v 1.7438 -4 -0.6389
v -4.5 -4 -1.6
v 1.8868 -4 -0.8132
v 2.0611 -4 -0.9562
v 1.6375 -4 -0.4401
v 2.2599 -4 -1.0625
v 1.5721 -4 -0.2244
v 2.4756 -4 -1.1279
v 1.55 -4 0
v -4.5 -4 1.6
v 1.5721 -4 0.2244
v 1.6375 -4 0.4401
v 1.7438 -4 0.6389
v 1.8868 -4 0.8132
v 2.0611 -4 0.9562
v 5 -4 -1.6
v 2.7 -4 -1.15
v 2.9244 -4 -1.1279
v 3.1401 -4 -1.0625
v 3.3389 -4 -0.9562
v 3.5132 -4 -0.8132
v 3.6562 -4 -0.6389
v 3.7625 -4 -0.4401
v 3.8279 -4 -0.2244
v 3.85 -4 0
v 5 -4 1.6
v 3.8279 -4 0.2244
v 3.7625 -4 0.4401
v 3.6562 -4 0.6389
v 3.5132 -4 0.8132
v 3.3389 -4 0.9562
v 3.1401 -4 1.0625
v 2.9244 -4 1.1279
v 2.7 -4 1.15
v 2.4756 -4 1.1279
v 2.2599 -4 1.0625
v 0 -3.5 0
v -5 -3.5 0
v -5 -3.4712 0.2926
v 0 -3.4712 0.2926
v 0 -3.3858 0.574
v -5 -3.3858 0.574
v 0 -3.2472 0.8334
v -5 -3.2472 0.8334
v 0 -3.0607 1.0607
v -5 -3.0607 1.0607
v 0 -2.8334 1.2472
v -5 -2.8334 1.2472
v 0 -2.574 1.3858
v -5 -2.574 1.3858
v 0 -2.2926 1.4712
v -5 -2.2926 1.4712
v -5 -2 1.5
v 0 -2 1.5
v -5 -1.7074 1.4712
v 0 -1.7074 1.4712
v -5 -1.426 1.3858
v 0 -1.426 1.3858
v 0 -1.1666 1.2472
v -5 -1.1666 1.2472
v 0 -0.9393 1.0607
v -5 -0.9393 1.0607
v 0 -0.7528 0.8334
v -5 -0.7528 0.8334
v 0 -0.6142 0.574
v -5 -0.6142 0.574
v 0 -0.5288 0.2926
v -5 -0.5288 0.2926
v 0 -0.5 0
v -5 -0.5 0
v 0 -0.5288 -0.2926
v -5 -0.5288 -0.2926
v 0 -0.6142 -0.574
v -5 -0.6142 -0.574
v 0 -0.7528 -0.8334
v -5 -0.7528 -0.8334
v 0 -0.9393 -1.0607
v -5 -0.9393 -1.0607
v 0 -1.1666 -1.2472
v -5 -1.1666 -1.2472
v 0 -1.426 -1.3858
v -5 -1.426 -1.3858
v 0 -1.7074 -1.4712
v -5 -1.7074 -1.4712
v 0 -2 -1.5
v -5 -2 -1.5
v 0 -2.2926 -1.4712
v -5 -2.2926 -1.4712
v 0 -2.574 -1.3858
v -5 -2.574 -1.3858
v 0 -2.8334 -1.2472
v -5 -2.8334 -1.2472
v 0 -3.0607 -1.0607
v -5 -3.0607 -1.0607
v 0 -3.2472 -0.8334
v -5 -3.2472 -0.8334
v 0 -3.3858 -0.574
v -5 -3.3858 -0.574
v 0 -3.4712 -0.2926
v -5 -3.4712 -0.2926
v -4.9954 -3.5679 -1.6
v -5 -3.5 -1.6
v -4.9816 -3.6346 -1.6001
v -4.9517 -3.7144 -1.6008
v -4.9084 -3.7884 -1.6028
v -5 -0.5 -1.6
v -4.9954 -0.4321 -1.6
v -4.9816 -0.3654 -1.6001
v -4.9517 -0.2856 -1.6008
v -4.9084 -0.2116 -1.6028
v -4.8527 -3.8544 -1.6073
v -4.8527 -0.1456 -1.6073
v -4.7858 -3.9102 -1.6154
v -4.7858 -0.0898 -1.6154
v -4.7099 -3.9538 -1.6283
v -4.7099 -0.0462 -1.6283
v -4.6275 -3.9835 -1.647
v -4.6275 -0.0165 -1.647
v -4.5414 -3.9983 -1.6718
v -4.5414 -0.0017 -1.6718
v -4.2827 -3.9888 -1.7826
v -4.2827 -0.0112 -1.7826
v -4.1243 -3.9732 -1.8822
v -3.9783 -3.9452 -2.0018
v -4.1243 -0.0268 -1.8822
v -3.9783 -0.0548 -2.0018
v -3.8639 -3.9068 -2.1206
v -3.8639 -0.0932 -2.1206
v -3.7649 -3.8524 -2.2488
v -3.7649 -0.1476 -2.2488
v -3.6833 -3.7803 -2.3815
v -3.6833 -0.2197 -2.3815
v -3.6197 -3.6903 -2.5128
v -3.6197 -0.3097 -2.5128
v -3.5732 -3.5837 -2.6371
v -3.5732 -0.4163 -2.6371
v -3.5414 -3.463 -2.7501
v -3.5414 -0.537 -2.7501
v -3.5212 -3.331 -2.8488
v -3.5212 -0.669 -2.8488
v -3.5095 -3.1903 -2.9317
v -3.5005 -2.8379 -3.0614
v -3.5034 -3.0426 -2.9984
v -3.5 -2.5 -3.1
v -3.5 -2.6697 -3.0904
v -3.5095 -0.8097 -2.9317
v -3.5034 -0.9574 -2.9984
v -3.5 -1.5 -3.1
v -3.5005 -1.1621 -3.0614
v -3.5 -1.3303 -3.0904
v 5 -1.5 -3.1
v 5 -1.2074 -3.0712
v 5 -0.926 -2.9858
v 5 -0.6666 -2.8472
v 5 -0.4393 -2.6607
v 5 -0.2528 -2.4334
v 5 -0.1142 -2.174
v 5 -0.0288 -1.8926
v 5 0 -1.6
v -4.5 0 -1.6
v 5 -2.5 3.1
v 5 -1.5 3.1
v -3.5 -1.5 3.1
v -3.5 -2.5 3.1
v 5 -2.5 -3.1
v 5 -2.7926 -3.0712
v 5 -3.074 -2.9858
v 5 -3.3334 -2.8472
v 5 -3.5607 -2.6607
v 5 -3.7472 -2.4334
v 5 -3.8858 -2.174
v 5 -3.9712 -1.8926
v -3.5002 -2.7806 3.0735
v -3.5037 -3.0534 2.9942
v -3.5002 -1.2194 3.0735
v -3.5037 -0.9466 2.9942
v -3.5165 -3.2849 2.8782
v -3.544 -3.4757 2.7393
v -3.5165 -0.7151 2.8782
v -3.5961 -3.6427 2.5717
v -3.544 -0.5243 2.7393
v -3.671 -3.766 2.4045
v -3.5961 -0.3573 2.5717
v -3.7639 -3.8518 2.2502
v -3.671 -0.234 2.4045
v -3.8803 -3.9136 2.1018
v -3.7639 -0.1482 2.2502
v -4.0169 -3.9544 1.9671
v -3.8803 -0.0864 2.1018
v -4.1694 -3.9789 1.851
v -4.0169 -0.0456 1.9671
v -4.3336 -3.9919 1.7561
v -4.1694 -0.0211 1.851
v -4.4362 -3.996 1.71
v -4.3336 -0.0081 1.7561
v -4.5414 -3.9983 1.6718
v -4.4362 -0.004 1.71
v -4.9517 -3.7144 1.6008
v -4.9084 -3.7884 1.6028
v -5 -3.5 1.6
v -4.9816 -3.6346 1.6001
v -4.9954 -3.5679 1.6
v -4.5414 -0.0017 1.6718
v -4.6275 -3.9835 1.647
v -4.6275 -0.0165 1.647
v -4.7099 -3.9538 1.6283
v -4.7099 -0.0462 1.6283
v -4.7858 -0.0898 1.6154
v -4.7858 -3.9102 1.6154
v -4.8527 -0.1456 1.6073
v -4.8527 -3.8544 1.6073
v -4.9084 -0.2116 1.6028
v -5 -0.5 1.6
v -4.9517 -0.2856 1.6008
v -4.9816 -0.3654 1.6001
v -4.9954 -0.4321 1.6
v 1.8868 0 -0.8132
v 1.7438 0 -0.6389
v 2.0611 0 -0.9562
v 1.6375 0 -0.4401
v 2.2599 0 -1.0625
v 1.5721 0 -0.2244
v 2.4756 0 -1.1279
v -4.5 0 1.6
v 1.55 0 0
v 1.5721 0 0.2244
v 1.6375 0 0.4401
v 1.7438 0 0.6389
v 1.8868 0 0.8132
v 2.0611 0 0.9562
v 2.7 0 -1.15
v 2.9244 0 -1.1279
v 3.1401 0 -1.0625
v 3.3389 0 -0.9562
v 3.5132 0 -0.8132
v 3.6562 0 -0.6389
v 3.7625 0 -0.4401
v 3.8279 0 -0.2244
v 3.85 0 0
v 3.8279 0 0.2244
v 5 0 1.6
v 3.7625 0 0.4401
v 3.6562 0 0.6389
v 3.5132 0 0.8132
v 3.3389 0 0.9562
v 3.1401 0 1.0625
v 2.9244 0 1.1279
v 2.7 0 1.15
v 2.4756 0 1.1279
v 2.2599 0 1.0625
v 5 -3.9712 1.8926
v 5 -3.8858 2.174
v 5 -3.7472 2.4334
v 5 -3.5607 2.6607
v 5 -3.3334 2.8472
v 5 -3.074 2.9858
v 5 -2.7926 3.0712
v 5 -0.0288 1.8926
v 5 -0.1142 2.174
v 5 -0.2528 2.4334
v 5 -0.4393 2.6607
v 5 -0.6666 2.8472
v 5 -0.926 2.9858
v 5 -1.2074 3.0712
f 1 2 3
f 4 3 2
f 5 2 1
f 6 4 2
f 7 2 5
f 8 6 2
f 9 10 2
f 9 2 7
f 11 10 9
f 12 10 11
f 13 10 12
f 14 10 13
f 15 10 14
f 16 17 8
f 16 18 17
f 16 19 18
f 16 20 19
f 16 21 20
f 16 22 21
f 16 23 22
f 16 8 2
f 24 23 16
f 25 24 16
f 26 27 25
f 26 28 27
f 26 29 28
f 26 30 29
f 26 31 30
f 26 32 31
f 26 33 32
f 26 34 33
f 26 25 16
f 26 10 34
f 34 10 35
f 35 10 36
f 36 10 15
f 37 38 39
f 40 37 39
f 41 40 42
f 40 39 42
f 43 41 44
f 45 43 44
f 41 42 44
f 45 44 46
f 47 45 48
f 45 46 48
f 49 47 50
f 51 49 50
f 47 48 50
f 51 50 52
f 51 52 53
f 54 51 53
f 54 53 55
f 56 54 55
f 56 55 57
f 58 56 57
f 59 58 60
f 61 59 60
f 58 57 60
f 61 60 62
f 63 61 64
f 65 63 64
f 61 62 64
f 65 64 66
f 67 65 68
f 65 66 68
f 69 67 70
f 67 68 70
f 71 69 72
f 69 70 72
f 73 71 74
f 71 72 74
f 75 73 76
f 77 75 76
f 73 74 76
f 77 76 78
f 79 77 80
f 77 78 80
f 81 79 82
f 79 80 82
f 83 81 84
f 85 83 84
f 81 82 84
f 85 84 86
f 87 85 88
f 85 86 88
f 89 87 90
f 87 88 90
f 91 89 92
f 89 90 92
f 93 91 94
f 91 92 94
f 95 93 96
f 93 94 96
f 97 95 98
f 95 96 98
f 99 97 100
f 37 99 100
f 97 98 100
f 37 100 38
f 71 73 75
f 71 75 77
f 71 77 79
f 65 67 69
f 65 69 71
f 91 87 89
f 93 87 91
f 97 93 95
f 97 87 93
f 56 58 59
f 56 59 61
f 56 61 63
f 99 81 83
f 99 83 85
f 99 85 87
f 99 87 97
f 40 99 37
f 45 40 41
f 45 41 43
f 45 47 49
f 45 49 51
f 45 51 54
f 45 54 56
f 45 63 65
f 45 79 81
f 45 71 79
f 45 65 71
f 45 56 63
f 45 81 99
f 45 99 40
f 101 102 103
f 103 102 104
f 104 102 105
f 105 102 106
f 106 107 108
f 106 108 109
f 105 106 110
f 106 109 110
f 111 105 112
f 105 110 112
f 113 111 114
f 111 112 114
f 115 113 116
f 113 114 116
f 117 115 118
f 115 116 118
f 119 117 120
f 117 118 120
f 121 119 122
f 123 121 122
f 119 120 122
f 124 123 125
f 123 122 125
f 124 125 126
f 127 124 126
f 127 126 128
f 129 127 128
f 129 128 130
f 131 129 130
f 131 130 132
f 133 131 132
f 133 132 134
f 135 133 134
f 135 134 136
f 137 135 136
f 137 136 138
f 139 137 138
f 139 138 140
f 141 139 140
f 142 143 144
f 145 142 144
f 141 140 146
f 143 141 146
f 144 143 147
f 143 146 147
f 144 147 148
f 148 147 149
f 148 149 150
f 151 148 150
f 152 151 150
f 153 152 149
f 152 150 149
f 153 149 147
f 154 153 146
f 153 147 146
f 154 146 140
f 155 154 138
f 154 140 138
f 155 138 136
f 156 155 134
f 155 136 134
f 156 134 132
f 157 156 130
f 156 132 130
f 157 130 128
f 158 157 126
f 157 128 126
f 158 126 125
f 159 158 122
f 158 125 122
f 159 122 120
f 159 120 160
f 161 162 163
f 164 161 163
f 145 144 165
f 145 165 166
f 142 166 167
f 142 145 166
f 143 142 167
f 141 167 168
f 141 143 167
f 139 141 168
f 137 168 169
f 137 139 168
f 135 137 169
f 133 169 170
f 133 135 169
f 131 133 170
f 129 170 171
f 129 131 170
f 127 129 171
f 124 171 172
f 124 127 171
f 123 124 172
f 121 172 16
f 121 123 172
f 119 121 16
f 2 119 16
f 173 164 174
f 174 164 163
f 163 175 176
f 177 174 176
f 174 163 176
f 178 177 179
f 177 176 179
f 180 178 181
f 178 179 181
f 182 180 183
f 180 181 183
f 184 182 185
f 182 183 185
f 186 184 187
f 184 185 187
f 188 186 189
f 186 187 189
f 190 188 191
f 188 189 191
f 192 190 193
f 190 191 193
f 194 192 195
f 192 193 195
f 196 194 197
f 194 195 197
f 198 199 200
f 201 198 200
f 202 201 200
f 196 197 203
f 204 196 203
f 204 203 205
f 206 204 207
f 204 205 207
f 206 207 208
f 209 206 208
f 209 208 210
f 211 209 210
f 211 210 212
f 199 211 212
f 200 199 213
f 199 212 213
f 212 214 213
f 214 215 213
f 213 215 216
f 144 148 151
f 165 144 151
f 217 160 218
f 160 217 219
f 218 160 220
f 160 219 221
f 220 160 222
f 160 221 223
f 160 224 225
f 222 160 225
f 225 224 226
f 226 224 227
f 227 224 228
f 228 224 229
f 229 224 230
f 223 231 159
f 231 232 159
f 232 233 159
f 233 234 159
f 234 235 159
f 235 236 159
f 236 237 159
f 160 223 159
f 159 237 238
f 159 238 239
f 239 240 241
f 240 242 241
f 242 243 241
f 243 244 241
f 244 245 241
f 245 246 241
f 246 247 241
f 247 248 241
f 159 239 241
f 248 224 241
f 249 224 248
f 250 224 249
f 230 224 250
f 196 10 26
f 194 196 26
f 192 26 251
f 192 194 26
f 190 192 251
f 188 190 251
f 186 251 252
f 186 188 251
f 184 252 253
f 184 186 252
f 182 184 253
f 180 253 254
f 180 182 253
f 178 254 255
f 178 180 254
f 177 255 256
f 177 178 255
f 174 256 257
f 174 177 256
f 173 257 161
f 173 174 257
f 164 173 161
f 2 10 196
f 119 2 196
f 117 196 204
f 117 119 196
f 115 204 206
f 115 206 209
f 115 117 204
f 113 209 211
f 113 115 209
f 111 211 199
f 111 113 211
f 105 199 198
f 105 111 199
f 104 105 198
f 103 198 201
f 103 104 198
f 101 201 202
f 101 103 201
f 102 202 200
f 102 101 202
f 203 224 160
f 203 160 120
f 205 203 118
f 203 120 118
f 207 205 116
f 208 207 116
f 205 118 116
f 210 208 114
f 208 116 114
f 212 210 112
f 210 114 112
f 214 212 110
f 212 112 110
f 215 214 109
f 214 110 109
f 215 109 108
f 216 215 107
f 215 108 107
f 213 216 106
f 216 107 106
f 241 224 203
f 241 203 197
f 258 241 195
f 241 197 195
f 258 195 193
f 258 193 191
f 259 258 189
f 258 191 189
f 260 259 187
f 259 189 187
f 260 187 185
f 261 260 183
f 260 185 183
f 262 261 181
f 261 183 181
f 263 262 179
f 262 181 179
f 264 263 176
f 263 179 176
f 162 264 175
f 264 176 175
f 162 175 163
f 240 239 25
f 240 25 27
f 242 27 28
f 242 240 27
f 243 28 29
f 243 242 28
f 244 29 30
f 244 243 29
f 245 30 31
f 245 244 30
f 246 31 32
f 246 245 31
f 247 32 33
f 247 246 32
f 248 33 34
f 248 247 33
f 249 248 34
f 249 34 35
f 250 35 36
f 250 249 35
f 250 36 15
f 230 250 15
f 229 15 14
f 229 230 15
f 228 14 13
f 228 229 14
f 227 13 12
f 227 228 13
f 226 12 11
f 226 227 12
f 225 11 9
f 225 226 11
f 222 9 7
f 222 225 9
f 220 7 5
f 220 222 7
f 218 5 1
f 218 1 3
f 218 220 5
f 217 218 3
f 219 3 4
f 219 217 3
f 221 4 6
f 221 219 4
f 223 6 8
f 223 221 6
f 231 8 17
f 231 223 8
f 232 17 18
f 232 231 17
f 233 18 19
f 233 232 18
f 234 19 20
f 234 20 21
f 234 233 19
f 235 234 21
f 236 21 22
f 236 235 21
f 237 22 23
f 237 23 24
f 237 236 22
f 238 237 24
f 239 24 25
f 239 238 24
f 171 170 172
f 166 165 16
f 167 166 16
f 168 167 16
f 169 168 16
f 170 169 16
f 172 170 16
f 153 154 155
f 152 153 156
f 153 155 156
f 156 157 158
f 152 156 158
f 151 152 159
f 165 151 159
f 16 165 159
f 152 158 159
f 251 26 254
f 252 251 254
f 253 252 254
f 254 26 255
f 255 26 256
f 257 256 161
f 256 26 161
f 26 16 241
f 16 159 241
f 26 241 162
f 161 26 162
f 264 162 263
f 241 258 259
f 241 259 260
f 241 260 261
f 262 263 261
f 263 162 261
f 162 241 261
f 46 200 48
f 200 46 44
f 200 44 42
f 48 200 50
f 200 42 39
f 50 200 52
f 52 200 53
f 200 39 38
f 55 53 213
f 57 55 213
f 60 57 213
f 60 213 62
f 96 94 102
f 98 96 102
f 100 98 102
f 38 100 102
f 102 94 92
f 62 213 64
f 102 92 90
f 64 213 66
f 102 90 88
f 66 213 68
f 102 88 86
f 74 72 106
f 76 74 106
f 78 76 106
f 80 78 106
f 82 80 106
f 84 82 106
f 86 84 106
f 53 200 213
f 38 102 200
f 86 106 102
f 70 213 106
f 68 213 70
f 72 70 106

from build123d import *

# Parameters (mm, degrees)
F0_R        = 1.15
F1_DEPTH    = 4
F2_R        = 1.5
F3_DEPTH    = 5
F4_T1_DEPTH = 16
F5_R        = 0.49999


# Not quite as in the source:
# - a fillet or chamfer that OpenCascade refuses, or shapes differently, is made with other operations: its cross-section is extruded or revolved along the edge and cut away or added
# - a fillet or chamfer is up to 0.001 mm smaller than in the source, because OpenCascade refuses the exact size


with BuildPart() as f1:
    # F0 (on Front) → F1 (new body)
    with BuildSketch(Plane.XZ):
        with BuildLine():
            Line((-3.5, -3.1), (5, -3.1))
            Line((5, -3.1), (5, 3.1))
            Line((5, 3.1), (-3.5, 3.1))
            ThreePointArc((-3.5, 3.1), (-3.9393398282, 2.0393398282), (-5, 1.6))
            Line((-5, 1.6), (-5, -1.6))
            ThreePointArc((-5, -1.6), (-3.9393398282, -2.0393398282), (-3.5, -3.1))
        make_face()
        with Locations((2.7, 0)):
            Circle(F0_R, mode=Mode.SUBTRACT)
    extrude(amount=F1_DEPTH)

    # F2 (on face) → F3 (cut)
    with BuildSketch(Plane(origin=(-5, 0, 0), x_dir=(0, -1, 0), z_dir=(-1, 0, 0))):
        with Locations((2, 0)):
            Circle(F2_R)
    extrude(amount=-F3_DEPTH, mode=Mode.SUBTRACT)

    # F4: fillet of radius 1.5 on 4 edges, made by hand

    # F4_s2 → F4_t1 (cut)
    with BuildSketch(Plane.YZ.offset(-7.25)):
        with BuildLine():
            ThreePointArc((0, 1.6), (-0.4393398282, 2.6606601718), (-1.5, 3.1))
            Line((-1.5, 3.1), (0, 3.1))
            Line((0, 3.1), (0, 1.6))
        make_face()
        with BuildLine():
            ThreePointArc((-4, 1.6), (-3.5606601718, 2.6606601718), (-2.5, 3.1))
            Line((-2.5, 3.1), (-4, 3.1))
            Line((-4, 3.1), (-4, 1.6))
        make_face()
        with BuildLine():
            ThreePointArc((-2.5, -3.1), (-3.5606601718, -2.6606601718), (-4, -1.6))
            Line((-4, -1.6), (-4, -3.1))
            Line((-4, -3.1), (-2.5, -3.1))
        make_face()
        with BuildLine():
            ThreePointArc((-1.5, -3.1), (-0.4393398282, -2.6606601718), (0, -1.6))
            Line((0, -1.6), (0, -3.1))
            Line((0, -3.1), (-1.5, -3.1))
        make_face()
    extrude(amount=F4_T1_DEPTH, mode=Mode.SUBTRACT)

    # F5 (radius 0.5 in the source; OpenCascade refuses exactly that, so slightly less here)
    f5_edges = [f1.edges().sort_by_distance(p)[0] for p in [
        (-5, 0, 0),
        (-5, -4, 0),
    ]]
    fillet(f5_edges, radius=F5_R)


solid = f1.part
